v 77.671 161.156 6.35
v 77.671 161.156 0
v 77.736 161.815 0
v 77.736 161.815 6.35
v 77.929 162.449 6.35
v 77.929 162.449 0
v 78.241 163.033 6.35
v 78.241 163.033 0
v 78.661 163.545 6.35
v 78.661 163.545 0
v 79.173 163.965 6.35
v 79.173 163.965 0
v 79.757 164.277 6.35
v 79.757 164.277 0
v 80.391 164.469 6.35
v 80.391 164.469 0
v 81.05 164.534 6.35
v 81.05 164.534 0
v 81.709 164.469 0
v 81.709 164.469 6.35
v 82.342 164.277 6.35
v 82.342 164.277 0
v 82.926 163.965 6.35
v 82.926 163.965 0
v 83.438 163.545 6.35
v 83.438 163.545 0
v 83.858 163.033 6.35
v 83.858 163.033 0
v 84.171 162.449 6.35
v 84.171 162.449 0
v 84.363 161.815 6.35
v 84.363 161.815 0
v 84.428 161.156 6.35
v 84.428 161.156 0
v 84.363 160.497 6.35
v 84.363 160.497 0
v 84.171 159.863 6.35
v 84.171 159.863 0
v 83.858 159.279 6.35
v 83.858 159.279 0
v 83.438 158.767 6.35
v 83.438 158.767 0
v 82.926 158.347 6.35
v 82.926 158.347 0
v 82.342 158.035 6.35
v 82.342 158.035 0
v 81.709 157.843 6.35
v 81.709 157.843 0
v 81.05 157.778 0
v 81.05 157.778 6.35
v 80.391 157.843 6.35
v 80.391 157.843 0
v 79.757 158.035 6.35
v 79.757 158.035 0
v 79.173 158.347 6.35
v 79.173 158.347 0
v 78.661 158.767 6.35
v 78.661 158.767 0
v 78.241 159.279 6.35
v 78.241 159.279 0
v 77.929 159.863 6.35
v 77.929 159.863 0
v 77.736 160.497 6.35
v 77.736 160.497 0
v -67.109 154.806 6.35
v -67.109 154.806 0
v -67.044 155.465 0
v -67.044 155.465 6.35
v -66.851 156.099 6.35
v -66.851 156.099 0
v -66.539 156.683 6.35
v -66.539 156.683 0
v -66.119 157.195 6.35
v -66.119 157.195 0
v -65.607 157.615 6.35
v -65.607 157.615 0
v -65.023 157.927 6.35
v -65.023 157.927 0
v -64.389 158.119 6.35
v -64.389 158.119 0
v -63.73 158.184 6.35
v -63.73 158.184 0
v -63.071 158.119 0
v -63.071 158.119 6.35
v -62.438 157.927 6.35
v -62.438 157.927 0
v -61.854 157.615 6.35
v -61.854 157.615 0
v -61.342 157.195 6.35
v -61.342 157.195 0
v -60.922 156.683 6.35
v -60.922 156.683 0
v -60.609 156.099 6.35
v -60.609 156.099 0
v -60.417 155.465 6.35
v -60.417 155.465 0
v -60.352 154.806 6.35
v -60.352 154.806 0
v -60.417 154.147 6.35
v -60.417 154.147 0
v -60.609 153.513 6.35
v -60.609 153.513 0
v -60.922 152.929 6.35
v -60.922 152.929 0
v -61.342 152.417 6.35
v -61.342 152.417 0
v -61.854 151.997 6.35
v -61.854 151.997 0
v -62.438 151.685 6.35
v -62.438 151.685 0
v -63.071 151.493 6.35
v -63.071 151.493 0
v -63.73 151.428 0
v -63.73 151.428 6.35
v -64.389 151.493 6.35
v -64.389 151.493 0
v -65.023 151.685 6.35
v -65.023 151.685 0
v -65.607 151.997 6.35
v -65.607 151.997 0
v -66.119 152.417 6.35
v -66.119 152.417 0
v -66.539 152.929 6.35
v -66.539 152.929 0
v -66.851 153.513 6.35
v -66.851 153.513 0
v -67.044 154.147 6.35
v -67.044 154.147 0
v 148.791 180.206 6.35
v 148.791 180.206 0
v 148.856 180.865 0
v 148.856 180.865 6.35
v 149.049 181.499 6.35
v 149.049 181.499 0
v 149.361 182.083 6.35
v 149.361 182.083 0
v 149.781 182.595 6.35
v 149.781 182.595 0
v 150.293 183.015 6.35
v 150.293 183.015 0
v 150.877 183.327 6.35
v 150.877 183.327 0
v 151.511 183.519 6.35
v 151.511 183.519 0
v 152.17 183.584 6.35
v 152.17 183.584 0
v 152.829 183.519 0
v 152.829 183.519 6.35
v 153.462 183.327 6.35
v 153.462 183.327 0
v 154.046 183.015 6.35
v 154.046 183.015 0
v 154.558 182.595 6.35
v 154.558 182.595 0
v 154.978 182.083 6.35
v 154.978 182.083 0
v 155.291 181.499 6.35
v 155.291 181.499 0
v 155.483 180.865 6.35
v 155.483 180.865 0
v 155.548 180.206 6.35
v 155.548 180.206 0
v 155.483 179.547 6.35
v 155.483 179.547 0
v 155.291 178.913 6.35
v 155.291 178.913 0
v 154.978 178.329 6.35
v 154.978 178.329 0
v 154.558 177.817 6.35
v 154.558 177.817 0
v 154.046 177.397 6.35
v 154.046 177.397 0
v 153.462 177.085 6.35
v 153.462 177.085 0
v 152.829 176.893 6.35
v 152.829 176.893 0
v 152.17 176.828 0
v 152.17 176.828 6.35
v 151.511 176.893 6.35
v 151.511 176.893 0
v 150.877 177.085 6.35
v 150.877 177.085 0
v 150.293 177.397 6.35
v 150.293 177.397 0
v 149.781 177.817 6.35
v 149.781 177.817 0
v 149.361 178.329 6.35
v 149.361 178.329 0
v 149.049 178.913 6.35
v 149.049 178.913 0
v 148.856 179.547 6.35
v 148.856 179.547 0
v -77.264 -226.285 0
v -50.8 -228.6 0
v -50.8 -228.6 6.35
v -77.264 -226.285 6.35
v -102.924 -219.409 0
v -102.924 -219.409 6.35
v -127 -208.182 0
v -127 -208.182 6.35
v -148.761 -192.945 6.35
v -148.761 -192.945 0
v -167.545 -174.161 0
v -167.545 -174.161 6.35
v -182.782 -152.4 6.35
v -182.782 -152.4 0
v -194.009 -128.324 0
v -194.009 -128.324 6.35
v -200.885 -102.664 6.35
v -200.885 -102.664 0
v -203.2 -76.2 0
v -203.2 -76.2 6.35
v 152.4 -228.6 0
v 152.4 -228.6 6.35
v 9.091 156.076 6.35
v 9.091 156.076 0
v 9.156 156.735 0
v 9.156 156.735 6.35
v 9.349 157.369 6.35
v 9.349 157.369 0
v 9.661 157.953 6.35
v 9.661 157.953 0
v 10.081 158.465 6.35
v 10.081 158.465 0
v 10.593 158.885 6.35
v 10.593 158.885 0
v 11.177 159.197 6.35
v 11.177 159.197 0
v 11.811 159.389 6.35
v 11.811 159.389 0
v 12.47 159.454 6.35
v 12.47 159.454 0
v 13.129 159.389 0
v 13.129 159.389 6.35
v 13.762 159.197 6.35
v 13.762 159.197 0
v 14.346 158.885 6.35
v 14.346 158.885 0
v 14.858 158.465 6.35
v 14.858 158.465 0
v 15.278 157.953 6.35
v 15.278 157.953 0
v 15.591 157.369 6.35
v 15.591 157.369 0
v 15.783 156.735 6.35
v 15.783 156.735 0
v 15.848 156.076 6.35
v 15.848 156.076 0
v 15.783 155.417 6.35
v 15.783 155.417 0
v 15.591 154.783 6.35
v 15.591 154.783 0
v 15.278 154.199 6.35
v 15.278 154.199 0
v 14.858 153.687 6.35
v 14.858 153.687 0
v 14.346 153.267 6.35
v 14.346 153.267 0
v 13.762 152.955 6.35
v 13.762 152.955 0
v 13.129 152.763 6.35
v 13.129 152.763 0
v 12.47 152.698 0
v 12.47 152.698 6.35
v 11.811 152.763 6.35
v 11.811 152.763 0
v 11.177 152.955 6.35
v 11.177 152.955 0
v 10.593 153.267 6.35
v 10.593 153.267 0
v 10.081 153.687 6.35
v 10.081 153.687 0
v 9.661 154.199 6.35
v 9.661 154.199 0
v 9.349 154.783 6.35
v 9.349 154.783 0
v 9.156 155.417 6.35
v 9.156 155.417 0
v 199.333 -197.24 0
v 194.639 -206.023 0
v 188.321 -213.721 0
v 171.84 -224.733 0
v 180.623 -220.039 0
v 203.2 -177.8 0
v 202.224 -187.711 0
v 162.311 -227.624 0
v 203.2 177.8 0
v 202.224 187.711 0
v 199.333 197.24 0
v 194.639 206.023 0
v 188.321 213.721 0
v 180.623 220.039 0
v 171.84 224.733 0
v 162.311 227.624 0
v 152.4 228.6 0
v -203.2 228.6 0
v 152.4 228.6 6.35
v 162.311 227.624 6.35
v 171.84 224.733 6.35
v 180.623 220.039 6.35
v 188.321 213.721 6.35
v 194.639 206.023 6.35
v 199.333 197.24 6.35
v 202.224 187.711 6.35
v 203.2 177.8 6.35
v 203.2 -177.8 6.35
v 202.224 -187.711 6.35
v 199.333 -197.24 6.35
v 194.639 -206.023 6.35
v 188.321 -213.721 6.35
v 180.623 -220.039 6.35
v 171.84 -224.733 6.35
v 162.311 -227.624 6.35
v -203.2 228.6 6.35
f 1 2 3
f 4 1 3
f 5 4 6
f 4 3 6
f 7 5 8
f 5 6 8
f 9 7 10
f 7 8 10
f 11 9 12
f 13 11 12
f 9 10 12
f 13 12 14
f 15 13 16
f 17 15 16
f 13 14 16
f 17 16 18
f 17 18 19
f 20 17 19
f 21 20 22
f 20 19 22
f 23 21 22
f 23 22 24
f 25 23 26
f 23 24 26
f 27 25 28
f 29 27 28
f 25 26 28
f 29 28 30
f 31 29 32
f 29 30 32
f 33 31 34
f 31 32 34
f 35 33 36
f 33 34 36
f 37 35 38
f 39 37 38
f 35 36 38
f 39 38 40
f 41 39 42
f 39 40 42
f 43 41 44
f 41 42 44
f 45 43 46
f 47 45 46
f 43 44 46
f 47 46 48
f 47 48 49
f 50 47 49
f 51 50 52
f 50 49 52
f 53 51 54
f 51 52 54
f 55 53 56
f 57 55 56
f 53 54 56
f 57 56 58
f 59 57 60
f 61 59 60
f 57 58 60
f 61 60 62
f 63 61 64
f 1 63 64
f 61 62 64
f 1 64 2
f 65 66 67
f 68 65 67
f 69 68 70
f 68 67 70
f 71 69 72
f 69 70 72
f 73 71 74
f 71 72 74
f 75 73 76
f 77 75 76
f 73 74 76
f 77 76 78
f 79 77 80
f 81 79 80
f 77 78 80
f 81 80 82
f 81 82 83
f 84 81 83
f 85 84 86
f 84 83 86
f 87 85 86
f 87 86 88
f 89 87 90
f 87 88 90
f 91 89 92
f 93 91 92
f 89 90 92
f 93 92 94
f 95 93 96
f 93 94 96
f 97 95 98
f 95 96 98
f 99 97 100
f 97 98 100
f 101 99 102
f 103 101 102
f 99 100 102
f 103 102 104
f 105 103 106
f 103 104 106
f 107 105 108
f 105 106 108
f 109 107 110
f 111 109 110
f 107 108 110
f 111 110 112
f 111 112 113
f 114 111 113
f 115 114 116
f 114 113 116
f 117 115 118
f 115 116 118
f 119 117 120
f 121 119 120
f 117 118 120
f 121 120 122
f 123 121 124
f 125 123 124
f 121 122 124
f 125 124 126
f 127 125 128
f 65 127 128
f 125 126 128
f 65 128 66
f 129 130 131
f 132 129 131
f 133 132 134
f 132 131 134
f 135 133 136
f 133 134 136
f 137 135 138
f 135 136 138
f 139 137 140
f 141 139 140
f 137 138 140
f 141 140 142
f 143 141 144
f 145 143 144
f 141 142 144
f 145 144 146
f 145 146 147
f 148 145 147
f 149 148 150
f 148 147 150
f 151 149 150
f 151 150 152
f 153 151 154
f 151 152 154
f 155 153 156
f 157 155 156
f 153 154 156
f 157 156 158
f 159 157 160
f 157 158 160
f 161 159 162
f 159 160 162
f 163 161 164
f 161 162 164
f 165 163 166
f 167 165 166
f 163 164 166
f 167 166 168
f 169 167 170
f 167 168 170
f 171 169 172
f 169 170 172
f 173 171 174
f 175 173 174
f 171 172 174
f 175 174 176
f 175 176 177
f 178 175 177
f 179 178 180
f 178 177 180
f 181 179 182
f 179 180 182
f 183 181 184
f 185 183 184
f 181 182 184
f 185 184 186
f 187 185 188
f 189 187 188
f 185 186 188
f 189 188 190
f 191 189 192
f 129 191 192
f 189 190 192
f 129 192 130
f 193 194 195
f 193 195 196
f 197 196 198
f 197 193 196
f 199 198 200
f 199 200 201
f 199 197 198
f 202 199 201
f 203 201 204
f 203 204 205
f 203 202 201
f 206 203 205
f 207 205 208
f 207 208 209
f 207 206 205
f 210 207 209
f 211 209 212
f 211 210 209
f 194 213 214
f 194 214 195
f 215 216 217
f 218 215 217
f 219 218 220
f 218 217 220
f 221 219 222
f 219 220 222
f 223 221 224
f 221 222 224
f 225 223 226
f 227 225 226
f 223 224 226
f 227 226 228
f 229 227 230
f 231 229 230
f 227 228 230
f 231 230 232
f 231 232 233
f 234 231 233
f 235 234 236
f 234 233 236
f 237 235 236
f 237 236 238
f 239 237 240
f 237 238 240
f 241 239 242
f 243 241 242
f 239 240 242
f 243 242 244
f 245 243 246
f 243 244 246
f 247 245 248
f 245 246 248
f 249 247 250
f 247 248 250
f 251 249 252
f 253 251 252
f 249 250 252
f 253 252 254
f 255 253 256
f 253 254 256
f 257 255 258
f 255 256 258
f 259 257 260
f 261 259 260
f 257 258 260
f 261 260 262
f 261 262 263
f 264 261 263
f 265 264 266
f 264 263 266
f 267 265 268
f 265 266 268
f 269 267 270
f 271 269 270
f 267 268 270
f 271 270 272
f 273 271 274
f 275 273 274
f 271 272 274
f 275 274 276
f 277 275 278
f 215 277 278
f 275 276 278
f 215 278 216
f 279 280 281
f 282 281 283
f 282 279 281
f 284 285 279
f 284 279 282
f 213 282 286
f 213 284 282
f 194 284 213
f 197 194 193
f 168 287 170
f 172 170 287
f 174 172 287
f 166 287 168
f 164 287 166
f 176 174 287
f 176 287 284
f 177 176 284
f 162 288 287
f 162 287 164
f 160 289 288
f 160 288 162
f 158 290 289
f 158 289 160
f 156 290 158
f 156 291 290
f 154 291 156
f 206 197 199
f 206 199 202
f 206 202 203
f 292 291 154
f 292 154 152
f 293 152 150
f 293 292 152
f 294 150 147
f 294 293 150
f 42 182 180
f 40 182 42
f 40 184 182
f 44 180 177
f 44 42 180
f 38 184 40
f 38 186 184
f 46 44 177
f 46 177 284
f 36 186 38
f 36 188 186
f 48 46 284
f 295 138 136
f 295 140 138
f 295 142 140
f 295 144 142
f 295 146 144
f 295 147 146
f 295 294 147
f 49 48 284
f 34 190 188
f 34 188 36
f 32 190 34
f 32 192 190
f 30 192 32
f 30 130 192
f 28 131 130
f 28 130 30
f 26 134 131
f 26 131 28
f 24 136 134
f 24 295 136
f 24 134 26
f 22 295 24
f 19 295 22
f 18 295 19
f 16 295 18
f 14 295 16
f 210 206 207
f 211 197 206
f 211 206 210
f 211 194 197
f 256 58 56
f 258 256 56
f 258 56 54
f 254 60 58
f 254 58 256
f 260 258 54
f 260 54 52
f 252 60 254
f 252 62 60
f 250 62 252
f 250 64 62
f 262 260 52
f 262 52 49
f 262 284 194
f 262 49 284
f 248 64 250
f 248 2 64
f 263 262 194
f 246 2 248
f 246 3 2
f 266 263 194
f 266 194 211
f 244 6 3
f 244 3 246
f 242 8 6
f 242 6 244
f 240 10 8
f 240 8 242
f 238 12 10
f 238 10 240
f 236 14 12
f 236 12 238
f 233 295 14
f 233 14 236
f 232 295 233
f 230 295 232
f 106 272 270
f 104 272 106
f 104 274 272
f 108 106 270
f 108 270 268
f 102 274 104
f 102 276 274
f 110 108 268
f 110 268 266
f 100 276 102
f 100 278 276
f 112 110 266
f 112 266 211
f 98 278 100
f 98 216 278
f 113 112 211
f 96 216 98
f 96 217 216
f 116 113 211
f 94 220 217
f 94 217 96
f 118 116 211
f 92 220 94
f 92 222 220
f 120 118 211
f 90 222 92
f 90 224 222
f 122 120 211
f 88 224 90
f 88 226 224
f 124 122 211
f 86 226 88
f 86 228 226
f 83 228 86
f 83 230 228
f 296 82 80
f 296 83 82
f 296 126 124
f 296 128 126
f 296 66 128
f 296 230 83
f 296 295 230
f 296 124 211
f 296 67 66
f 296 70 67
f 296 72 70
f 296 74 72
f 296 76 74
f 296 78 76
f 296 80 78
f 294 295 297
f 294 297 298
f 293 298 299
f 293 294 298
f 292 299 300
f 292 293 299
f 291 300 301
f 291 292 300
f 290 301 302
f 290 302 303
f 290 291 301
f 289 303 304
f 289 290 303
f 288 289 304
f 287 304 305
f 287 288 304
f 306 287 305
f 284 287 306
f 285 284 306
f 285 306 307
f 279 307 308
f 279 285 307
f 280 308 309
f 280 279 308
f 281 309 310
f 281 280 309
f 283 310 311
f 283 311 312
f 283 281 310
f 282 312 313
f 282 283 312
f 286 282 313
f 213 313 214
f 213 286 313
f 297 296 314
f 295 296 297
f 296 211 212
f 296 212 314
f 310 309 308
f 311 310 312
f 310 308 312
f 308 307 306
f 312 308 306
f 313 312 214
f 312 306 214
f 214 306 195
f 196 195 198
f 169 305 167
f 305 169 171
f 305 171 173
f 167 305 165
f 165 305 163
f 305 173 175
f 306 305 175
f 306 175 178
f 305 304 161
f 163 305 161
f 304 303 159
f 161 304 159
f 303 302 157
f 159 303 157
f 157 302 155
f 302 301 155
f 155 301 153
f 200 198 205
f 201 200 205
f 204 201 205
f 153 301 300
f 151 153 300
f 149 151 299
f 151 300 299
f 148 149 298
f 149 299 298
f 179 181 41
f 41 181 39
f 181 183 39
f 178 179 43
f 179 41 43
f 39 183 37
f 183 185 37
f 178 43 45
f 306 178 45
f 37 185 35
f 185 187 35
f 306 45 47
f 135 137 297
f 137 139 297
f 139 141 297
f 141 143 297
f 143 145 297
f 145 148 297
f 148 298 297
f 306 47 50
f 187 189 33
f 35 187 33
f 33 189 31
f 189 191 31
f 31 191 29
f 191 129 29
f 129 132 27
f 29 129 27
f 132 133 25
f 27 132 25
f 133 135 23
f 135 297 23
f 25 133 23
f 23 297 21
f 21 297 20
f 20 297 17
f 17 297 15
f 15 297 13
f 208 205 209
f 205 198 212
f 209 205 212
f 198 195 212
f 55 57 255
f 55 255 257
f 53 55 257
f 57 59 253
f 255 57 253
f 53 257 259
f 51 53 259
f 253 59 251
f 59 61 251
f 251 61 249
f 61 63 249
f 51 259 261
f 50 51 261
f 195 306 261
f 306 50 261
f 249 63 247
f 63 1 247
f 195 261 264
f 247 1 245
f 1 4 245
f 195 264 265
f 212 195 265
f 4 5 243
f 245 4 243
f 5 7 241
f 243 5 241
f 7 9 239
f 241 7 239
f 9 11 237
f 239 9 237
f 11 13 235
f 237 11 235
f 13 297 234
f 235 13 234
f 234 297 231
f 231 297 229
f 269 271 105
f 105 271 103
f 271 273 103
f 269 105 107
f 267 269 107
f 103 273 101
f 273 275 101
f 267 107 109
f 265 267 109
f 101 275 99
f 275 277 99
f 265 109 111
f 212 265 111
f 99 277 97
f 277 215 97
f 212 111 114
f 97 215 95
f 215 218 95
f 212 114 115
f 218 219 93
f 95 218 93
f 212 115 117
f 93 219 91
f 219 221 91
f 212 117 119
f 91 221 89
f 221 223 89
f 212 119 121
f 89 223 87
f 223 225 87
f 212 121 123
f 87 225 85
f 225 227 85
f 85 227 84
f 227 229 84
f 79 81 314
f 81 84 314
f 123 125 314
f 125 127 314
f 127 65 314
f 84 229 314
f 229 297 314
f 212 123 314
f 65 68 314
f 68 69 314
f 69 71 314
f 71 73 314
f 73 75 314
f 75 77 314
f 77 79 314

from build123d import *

# Parameters (mm, degrees)
BOSS_EXTRUDE1_DEPTH = 6.35
SKETCH2_R           = 3.3782
CUT_EXTRUDE1_DEPTH  = 6.35


with BuildPart() as part:
    # Sketch1 → Boss-Extrude1 (new body)
    with BuildSketch(Plane.XY):
        with BuildLine():
            Line((-203.2, 228.6), (152.4, 228.6))
            ThreePointArc((152.4, 228.6), (188.321024484, 213.721024484), (203.2, 177.8))
            Line((203.2, 177.8), (203.2, -177.8))
            ThreePointArc((203.2, -177.8), (188.321024484, -213.721024484), (152.4, -228.6))
            Line((152.4, -228.6), (-50.8, -228.6))
            ThreePointArc((-50.8, -228.6), (-158.563073453, -183.963073453), (-203.2, -76.2))
            Line((-203.2, -76.2), (-203.2, 228.6))
        make_face()
    extrude(amount=BOSS_EXTRUDE1_DEPTH)

    # Sketch2 → Cut-Extrude1 (cut)
    with BuildSketch(Plane(origin=(0, 0, 0), x_dir=(-1, 0, 0), z_dir=(0, 0, -1))):
        with Locations((-81.049562296, 161.155935463)):
            Circle(SKETCH2_R)
        with Locations((-152.169562296, 180.205935019)):
            Circle(SKETCH2_R)
        with Locations((63.730437704, 154.805935463)):
            Circle(SKETCH2_R)
        with Locations((-12.469562296, 156.075935463)):
            Circle(SKETCH2_R)
    extrude(amount=-CUT_EXTRUDE1_DEPTH, mode=Mode.SUBTRACT)


solid = part.part
